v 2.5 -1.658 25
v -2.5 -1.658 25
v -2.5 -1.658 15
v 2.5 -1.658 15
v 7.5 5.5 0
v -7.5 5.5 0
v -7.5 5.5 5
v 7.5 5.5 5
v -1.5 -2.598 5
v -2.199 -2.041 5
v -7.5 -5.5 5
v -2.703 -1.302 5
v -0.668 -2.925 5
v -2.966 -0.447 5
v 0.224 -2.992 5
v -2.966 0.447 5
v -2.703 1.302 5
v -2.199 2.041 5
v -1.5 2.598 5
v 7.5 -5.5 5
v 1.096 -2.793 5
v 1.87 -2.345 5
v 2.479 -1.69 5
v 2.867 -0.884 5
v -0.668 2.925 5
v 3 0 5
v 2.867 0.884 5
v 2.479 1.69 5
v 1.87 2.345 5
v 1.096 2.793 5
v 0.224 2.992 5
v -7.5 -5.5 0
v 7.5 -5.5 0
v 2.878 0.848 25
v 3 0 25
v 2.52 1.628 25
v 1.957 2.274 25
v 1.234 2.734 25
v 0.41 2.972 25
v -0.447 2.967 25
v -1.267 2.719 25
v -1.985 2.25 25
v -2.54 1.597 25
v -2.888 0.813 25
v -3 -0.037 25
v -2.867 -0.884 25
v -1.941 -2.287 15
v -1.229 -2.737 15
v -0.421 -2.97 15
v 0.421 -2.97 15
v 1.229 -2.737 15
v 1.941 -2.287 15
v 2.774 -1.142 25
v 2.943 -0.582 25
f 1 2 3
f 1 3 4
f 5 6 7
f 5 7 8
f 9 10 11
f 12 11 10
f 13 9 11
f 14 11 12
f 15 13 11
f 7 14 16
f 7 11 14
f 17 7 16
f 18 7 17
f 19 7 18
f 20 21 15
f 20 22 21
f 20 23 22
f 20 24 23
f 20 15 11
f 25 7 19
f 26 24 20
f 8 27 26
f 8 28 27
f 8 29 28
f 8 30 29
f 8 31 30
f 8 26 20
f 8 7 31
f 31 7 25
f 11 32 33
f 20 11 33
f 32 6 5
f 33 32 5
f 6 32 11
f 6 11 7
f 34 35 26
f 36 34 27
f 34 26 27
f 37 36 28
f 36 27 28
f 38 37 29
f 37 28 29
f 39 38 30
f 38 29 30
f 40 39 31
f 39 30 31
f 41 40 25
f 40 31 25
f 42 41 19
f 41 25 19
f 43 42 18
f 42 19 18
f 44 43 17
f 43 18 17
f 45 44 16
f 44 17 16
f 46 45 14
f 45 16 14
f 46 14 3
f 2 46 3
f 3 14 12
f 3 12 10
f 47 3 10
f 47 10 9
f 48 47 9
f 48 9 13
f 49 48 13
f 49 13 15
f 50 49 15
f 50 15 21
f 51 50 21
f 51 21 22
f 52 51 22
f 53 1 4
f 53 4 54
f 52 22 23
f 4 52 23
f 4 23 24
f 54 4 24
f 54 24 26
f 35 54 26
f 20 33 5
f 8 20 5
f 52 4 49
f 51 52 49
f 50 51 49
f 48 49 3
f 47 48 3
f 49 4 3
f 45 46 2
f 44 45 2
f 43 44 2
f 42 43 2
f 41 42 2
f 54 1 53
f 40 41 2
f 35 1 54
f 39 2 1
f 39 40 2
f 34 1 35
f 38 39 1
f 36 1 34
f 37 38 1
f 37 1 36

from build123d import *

# Parameters (mm, degrees)
ESQUISSE1_W             = 15
ESQUISSE1_H             = 11
BOSS_EXTRU_1_DEPTH      = 5
ESQUISSE2_R             = 3
BOSS_EXTRU_2_DEPTH      = 20
ENL_V_MAT_EXTRU_1_DEPTH = 10


with BuildPart() as part:
    # Esquisse1 → Boss.-Extru.1 (new body)
    with BuildSketch(Plane.XY):
        Rectangle(ESQUISSE1_W, ESQUISSE1_H)
    extrude(amount=BOSS_EXTRU_1_DEPTH)

    # Esquisse2 → Boss.-Extru.2 (add)
    with BuildSketch(Plane.XY.offset(5)):
        Circle(ESQUISSE2_R)
    extrude(amount=BOSS_EXTRU_2_DEPTH)

    # Esquisse3 → Enlèv. mat.-Extru.1 (cut)
    with BuildSketch(Plane.XY.offset(25)):
        with BuildLine():
            Line((-2.5, -1.658312395), (2.5, -1.658312395))
            ThreePointArc((2.5, -1.658312395), (0, -3), (-2.5, -1.658312395))
        make_face()
    extrude(amount=-ENL_V_MAT_EXTRU_1_DEPTH, mode=Mode.SUBTRACT)


solid = part.part
